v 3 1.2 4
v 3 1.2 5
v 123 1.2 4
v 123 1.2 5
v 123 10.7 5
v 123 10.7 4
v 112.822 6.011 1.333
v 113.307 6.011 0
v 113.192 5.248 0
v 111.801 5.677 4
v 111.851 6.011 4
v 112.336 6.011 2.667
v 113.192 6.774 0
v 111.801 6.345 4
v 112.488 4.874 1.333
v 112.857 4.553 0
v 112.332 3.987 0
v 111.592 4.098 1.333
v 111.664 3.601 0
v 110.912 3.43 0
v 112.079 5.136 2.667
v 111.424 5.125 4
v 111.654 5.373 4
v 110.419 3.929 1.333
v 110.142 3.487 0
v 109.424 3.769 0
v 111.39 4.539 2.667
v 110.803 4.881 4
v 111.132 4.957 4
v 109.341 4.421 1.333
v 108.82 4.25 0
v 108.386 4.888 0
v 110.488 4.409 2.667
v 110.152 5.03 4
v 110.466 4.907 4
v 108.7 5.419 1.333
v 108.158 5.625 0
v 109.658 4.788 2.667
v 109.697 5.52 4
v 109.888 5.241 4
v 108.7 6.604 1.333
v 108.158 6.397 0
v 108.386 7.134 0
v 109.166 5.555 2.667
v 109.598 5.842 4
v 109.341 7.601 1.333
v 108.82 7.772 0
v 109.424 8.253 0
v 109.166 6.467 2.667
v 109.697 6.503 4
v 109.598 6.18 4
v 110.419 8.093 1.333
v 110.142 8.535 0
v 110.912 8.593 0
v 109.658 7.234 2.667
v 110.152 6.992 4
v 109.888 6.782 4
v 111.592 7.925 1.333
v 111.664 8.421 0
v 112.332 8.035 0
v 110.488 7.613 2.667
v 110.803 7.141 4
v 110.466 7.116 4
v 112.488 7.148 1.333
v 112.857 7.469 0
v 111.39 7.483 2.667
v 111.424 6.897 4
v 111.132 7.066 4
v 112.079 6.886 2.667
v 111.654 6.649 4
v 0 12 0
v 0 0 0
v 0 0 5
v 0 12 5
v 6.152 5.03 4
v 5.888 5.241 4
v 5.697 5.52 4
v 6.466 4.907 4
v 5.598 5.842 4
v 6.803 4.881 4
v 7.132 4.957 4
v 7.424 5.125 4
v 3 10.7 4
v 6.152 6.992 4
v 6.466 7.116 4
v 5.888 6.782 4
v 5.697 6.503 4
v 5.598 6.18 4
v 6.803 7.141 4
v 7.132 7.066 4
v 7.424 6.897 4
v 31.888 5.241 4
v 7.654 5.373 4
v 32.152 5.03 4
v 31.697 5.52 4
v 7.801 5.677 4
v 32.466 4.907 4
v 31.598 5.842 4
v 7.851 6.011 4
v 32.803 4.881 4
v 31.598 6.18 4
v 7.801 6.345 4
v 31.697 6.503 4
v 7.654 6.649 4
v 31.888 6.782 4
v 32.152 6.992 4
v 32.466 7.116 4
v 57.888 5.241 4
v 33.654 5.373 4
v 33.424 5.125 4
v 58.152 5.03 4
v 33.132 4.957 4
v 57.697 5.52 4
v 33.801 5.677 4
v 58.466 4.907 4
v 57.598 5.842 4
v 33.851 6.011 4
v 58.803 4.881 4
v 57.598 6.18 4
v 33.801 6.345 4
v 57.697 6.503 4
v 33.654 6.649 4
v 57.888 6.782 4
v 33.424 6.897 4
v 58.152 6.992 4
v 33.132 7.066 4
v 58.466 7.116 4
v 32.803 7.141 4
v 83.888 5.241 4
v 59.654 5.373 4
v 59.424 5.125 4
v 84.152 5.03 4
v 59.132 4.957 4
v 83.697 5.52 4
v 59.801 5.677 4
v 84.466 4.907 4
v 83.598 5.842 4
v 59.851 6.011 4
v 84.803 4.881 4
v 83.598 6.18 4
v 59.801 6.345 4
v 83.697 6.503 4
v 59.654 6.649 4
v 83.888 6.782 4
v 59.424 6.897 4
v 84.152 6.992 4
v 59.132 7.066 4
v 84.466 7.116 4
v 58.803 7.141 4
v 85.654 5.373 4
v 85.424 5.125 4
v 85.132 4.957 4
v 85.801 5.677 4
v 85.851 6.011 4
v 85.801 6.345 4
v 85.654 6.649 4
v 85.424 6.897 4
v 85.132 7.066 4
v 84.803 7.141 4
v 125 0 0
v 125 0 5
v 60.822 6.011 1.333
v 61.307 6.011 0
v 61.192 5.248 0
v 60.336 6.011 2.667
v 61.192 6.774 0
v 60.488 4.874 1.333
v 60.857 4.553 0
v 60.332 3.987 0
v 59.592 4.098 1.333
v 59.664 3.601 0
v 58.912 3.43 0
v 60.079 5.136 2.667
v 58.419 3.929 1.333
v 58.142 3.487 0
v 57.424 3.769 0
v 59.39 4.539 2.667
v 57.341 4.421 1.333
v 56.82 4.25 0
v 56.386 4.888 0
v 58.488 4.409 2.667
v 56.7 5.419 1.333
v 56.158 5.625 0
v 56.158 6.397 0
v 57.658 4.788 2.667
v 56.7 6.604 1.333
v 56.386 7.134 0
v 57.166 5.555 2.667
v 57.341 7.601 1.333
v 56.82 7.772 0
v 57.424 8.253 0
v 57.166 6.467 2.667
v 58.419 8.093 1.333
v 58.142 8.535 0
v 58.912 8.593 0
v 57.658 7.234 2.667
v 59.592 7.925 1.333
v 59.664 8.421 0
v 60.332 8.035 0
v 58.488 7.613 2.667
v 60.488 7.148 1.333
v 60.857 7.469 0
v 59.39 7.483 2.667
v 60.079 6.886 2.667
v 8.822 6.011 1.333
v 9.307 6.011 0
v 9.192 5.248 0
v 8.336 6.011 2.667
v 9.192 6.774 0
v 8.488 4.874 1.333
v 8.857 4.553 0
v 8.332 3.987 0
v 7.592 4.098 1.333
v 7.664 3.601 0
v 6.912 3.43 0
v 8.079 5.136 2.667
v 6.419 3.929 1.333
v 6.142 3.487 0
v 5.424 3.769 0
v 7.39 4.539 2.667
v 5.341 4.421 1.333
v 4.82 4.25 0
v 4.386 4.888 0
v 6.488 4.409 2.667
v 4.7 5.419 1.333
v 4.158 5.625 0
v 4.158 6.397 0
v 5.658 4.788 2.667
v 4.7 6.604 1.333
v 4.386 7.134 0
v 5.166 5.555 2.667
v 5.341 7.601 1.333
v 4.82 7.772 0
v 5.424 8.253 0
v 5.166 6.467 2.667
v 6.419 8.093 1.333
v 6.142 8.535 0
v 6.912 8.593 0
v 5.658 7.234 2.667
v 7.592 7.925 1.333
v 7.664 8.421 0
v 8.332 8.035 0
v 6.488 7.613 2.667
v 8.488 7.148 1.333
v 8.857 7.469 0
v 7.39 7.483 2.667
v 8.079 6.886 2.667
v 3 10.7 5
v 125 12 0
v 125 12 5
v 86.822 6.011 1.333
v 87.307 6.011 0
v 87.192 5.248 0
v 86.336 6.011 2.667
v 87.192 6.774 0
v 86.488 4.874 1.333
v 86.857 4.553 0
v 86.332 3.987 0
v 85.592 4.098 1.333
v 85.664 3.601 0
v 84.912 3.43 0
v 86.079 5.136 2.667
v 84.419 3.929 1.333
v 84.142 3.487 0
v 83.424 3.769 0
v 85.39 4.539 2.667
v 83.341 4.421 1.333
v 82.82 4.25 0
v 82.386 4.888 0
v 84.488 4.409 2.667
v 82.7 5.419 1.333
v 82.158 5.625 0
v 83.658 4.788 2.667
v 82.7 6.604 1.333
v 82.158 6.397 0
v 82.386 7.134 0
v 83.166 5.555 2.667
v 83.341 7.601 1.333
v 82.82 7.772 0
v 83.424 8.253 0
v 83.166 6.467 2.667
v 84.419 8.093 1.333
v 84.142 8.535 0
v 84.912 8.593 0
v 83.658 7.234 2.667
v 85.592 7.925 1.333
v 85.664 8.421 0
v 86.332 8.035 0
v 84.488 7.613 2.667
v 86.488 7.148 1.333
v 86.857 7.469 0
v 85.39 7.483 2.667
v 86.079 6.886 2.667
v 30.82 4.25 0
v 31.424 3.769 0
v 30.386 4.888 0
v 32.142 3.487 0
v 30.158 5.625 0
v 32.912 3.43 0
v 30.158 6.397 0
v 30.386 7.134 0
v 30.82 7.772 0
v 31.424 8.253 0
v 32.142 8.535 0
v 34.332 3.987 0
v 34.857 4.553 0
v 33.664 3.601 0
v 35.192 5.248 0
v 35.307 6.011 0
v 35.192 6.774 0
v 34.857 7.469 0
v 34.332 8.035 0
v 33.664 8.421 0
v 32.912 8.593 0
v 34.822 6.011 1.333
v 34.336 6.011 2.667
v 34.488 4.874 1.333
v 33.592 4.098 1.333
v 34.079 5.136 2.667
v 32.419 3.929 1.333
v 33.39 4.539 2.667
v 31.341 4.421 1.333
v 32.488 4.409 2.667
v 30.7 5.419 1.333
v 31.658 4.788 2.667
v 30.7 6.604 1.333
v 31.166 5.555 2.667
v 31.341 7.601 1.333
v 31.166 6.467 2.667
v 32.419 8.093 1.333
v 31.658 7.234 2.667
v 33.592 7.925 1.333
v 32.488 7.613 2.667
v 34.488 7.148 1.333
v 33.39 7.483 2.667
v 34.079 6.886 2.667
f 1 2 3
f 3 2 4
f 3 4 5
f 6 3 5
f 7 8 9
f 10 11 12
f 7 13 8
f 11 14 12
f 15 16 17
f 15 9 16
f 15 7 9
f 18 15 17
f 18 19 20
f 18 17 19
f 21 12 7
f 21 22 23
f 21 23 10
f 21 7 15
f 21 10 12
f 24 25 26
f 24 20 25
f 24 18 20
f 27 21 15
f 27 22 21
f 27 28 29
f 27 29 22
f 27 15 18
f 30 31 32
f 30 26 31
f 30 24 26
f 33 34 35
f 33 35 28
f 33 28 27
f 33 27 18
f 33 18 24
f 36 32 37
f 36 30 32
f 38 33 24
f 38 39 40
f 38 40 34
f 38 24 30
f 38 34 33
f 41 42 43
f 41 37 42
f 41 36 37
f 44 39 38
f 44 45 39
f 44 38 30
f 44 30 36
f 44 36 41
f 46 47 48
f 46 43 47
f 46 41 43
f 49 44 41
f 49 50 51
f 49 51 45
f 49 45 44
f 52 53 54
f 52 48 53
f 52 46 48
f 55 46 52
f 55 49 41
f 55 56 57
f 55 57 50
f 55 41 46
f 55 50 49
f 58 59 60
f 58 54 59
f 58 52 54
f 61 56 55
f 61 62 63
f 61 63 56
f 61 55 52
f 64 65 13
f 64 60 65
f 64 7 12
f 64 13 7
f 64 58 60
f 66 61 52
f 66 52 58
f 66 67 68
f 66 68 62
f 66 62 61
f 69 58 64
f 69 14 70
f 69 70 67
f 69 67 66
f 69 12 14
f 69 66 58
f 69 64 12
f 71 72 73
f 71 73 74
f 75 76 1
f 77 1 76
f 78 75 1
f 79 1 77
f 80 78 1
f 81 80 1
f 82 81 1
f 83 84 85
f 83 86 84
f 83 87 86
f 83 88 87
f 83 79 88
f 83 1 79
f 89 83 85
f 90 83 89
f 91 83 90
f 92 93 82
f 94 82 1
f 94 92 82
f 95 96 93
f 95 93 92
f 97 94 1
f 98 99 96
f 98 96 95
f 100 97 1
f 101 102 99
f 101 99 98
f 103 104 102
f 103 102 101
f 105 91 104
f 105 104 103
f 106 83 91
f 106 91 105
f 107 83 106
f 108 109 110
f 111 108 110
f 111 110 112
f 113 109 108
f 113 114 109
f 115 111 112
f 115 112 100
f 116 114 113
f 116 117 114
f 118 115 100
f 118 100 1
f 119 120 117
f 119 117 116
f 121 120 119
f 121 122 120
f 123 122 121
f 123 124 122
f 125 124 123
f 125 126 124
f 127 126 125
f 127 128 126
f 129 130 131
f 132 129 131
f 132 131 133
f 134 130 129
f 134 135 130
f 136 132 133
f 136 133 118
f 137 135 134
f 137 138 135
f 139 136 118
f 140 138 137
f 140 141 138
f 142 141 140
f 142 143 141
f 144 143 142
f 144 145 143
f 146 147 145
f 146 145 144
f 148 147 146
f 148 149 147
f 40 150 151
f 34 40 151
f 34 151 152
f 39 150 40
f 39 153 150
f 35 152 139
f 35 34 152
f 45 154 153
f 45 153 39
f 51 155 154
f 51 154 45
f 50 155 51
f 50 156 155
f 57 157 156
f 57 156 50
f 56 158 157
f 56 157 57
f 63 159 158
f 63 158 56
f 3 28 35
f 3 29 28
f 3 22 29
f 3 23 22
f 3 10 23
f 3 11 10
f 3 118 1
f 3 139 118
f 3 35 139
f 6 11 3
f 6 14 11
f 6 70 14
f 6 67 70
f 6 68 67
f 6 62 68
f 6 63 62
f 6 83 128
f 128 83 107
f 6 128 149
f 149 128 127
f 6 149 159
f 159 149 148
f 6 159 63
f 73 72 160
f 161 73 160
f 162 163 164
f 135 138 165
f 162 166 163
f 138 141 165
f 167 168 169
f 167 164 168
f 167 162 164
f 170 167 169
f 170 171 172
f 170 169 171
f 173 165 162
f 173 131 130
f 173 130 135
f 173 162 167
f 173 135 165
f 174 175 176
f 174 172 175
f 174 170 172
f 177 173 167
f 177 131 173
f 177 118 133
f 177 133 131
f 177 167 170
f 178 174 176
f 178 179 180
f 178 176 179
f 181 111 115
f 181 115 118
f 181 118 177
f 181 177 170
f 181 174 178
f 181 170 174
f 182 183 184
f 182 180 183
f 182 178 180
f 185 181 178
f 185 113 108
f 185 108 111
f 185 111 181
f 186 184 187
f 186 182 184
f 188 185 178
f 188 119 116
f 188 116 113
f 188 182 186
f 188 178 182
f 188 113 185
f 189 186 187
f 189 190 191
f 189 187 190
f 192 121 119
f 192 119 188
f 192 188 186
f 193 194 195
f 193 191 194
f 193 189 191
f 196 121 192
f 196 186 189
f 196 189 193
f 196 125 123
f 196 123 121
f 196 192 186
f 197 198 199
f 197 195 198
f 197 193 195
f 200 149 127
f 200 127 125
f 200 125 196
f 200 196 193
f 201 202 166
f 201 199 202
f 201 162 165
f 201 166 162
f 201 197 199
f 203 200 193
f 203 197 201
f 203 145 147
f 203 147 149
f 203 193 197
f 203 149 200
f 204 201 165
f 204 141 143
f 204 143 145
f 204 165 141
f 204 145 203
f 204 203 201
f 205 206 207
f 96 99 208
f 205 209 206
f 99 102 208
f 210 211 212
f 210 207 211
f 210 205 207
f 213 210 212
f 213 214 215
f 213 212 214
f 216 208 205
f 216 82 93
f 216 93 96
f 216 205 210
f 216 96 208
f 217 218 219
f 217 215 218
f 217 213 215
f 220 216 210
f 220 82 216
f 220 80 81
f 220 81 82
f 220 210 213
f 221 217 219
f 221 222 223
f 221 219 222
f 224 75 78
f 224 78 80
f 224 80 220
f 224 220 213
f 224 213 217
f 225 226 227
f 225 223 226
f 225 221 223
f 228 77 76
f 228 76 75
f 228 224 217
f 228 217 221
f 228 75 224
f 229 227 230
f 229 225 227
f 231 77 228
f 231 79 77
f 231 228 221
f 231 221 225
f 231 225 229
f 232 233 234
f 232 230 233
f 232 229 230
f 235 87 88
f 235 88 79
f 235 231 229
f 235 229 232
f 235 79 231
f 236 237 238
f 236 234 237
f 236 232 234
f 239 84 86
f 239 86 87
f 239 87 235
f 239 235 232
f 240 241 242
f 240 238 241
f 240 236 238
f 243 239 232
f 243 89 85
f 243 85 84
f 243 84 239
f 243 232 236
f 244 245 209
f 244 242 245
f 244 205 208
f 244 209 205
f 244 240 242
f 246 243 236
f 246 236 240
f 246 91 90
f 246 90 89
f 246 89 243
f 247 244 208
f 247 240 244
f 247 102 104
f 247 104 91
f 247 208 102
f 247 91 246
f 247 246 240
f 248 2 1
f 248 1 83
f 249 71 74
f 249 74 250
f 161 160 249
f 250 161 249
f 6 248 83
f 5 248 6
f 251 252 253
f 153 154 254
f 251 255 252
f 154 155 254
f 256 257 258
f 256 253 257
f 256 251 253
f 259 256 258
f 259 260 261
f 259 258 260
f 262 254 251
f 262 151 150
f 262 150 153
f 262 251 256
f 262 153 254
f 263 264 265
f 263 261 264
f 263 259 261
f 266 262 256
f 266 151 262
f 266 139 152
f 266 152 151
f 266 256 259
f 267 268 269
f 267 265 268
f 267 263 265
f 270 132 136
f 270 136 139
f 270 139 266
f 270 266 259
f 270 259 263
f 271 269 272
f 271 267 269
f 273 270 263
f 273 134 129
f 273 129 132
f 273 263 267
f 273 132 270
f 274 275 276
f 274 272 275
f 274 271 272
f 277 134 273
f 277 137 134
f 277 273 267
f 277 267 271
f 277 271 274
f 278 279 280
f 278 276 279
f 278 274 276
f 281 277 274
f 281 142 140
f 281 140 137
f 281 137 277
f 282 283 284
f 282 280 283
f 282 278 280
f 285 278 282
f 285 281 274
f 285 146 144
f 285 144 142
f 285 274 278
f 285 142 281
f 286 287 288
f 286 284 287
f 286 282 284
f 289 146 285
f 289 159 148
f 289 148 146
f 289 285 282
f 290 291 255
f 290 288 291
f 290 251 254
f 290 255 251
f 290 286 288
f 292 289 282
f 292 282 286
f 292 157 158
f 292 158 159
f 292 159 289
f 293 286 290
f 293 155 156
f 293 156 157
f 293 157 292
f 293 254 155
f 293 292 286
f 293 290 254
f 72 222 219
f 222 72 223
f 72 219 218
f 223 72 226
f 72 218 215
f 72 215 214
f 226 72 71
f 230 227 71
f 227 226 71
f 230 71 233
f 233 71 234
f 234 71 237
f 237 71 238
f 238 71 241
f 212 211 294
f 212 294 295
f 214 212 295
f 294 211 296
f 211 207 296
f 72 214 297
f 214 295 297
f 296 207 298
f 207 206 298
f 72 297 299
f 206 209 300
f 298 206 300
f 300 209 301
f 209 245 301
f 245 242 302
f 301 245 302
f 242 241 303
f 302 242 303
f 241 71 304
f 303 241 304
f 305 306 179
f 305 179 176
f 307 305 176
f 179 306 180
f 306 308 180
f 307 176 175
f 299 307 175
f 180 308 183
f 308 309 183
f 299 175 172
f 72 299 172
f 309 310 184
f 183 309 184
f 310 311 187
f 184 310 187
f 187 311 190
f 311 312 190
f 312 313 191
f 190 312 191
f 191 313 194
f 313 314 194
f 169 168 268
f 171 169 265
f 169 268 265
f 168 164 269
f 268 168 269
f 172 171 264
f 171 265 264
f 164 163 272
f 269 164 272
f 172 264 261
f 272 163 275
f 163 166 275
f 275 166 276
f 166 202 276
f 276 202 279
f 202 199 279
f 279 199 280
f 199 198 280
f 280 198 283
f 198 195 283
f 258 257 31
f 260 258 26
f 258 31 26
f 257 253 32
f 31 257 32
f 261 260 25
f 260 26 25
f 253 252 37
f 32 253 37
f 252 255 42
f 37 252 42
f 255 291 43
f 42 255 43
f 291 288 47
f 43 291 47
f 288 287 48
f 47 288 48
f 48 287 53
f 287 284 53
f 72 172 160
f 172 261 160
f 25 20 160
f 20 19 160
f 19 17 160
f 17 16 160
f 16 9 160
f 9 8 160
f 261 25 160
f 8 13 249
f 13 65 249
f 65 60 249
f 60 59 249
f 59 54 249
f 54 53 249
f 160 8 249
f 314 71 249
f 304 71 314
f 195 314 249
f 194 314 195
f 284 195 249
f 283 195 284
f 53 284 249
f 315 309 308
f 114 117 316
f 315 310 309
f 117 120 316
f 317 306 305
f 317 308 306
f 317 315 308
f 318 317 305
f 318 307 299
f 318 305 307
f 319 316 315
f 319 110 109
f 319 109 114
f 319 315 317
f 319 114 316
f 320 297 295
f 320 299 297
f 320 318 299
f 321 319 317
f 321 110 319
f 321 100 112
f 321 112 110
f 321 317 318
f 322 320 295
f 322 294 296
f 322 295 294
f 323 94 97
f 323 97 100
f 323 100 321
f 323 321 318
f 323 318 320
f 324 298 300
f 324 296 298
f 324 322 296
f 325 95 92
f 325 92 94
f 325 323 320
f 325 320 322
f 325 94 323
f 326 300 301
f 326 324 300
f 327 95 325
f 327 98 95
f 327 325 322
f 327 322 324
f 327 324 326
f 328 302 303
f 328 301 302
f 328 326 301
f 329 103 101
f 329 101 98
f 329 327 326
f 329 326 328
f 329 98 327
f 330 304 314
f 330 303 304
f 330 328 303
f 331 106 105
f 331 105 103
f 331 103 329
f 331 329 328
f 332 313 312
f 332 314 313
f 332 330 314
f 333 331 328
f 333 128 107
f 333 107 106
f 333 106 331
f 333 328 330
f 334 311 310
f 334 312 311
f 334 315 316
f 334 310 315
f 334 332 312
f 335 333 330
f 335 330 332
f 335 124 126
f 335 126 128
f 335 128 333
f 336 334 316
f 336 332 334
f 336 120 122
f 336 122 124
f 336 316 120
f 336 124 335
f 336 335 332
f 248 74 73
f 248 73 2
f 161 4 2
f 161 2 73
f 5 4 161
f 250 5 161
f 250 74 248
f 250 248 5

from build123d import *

# Parameters (mm, degrees)
F0_W     = 125
F0_H     = 12
F1_DEPTH = 5
F2_W     = 120
F2_H     = 9.5
F3_DEPTH = 1
F4_R     = 2.5887659848
F5_DEPTH = 5
F5_TAPER = 20


with BuildPart() as f1:
    # F0 (on Top) → F1 (new body)
    with BuildSketch(Plane.XY):
        with Locations((62.5, 6)):
            Rectangle(F0_W, F0_H)
    extrude(amount=F1_DEPTH)

    # F2 (on face) → F3 (cut)
    with BuildSketch(Plane.XY.offset(5)):
        with Locations((63, 5.95)):
            Rectangle(F2_W, F2_H)
    extrude(amount=-F3_DEPTH, mode=Mode.SUBTRACT)

    # F4 (on face) → F5 (cut)
    with BuildSketch(Plane(origin=(0, 0, 0), x_dir=(1, 0, 0), z_dir=(0, 0, -1))):
        with Locations((6.7181466147, -6.0111363418)):
            Circle(F4_R)
        with Locations((32.7181466147, -6.0111363418)):
            Circle(F4_R)
        with Locations((58.7181466147, -6.0111363418)):
            Circle(F4_R)
        with Locations((84.7181466147, -6.0111363418)):
            Circle(F4_R)
        with Locations((110.7181466147, -6.0111363418)):
            Circle(F4_R)
    extrude(amount=-F5_DEPTH, taper=F5_TAPER, mode=Mode.SUBTRACT)


solid = f1.part
